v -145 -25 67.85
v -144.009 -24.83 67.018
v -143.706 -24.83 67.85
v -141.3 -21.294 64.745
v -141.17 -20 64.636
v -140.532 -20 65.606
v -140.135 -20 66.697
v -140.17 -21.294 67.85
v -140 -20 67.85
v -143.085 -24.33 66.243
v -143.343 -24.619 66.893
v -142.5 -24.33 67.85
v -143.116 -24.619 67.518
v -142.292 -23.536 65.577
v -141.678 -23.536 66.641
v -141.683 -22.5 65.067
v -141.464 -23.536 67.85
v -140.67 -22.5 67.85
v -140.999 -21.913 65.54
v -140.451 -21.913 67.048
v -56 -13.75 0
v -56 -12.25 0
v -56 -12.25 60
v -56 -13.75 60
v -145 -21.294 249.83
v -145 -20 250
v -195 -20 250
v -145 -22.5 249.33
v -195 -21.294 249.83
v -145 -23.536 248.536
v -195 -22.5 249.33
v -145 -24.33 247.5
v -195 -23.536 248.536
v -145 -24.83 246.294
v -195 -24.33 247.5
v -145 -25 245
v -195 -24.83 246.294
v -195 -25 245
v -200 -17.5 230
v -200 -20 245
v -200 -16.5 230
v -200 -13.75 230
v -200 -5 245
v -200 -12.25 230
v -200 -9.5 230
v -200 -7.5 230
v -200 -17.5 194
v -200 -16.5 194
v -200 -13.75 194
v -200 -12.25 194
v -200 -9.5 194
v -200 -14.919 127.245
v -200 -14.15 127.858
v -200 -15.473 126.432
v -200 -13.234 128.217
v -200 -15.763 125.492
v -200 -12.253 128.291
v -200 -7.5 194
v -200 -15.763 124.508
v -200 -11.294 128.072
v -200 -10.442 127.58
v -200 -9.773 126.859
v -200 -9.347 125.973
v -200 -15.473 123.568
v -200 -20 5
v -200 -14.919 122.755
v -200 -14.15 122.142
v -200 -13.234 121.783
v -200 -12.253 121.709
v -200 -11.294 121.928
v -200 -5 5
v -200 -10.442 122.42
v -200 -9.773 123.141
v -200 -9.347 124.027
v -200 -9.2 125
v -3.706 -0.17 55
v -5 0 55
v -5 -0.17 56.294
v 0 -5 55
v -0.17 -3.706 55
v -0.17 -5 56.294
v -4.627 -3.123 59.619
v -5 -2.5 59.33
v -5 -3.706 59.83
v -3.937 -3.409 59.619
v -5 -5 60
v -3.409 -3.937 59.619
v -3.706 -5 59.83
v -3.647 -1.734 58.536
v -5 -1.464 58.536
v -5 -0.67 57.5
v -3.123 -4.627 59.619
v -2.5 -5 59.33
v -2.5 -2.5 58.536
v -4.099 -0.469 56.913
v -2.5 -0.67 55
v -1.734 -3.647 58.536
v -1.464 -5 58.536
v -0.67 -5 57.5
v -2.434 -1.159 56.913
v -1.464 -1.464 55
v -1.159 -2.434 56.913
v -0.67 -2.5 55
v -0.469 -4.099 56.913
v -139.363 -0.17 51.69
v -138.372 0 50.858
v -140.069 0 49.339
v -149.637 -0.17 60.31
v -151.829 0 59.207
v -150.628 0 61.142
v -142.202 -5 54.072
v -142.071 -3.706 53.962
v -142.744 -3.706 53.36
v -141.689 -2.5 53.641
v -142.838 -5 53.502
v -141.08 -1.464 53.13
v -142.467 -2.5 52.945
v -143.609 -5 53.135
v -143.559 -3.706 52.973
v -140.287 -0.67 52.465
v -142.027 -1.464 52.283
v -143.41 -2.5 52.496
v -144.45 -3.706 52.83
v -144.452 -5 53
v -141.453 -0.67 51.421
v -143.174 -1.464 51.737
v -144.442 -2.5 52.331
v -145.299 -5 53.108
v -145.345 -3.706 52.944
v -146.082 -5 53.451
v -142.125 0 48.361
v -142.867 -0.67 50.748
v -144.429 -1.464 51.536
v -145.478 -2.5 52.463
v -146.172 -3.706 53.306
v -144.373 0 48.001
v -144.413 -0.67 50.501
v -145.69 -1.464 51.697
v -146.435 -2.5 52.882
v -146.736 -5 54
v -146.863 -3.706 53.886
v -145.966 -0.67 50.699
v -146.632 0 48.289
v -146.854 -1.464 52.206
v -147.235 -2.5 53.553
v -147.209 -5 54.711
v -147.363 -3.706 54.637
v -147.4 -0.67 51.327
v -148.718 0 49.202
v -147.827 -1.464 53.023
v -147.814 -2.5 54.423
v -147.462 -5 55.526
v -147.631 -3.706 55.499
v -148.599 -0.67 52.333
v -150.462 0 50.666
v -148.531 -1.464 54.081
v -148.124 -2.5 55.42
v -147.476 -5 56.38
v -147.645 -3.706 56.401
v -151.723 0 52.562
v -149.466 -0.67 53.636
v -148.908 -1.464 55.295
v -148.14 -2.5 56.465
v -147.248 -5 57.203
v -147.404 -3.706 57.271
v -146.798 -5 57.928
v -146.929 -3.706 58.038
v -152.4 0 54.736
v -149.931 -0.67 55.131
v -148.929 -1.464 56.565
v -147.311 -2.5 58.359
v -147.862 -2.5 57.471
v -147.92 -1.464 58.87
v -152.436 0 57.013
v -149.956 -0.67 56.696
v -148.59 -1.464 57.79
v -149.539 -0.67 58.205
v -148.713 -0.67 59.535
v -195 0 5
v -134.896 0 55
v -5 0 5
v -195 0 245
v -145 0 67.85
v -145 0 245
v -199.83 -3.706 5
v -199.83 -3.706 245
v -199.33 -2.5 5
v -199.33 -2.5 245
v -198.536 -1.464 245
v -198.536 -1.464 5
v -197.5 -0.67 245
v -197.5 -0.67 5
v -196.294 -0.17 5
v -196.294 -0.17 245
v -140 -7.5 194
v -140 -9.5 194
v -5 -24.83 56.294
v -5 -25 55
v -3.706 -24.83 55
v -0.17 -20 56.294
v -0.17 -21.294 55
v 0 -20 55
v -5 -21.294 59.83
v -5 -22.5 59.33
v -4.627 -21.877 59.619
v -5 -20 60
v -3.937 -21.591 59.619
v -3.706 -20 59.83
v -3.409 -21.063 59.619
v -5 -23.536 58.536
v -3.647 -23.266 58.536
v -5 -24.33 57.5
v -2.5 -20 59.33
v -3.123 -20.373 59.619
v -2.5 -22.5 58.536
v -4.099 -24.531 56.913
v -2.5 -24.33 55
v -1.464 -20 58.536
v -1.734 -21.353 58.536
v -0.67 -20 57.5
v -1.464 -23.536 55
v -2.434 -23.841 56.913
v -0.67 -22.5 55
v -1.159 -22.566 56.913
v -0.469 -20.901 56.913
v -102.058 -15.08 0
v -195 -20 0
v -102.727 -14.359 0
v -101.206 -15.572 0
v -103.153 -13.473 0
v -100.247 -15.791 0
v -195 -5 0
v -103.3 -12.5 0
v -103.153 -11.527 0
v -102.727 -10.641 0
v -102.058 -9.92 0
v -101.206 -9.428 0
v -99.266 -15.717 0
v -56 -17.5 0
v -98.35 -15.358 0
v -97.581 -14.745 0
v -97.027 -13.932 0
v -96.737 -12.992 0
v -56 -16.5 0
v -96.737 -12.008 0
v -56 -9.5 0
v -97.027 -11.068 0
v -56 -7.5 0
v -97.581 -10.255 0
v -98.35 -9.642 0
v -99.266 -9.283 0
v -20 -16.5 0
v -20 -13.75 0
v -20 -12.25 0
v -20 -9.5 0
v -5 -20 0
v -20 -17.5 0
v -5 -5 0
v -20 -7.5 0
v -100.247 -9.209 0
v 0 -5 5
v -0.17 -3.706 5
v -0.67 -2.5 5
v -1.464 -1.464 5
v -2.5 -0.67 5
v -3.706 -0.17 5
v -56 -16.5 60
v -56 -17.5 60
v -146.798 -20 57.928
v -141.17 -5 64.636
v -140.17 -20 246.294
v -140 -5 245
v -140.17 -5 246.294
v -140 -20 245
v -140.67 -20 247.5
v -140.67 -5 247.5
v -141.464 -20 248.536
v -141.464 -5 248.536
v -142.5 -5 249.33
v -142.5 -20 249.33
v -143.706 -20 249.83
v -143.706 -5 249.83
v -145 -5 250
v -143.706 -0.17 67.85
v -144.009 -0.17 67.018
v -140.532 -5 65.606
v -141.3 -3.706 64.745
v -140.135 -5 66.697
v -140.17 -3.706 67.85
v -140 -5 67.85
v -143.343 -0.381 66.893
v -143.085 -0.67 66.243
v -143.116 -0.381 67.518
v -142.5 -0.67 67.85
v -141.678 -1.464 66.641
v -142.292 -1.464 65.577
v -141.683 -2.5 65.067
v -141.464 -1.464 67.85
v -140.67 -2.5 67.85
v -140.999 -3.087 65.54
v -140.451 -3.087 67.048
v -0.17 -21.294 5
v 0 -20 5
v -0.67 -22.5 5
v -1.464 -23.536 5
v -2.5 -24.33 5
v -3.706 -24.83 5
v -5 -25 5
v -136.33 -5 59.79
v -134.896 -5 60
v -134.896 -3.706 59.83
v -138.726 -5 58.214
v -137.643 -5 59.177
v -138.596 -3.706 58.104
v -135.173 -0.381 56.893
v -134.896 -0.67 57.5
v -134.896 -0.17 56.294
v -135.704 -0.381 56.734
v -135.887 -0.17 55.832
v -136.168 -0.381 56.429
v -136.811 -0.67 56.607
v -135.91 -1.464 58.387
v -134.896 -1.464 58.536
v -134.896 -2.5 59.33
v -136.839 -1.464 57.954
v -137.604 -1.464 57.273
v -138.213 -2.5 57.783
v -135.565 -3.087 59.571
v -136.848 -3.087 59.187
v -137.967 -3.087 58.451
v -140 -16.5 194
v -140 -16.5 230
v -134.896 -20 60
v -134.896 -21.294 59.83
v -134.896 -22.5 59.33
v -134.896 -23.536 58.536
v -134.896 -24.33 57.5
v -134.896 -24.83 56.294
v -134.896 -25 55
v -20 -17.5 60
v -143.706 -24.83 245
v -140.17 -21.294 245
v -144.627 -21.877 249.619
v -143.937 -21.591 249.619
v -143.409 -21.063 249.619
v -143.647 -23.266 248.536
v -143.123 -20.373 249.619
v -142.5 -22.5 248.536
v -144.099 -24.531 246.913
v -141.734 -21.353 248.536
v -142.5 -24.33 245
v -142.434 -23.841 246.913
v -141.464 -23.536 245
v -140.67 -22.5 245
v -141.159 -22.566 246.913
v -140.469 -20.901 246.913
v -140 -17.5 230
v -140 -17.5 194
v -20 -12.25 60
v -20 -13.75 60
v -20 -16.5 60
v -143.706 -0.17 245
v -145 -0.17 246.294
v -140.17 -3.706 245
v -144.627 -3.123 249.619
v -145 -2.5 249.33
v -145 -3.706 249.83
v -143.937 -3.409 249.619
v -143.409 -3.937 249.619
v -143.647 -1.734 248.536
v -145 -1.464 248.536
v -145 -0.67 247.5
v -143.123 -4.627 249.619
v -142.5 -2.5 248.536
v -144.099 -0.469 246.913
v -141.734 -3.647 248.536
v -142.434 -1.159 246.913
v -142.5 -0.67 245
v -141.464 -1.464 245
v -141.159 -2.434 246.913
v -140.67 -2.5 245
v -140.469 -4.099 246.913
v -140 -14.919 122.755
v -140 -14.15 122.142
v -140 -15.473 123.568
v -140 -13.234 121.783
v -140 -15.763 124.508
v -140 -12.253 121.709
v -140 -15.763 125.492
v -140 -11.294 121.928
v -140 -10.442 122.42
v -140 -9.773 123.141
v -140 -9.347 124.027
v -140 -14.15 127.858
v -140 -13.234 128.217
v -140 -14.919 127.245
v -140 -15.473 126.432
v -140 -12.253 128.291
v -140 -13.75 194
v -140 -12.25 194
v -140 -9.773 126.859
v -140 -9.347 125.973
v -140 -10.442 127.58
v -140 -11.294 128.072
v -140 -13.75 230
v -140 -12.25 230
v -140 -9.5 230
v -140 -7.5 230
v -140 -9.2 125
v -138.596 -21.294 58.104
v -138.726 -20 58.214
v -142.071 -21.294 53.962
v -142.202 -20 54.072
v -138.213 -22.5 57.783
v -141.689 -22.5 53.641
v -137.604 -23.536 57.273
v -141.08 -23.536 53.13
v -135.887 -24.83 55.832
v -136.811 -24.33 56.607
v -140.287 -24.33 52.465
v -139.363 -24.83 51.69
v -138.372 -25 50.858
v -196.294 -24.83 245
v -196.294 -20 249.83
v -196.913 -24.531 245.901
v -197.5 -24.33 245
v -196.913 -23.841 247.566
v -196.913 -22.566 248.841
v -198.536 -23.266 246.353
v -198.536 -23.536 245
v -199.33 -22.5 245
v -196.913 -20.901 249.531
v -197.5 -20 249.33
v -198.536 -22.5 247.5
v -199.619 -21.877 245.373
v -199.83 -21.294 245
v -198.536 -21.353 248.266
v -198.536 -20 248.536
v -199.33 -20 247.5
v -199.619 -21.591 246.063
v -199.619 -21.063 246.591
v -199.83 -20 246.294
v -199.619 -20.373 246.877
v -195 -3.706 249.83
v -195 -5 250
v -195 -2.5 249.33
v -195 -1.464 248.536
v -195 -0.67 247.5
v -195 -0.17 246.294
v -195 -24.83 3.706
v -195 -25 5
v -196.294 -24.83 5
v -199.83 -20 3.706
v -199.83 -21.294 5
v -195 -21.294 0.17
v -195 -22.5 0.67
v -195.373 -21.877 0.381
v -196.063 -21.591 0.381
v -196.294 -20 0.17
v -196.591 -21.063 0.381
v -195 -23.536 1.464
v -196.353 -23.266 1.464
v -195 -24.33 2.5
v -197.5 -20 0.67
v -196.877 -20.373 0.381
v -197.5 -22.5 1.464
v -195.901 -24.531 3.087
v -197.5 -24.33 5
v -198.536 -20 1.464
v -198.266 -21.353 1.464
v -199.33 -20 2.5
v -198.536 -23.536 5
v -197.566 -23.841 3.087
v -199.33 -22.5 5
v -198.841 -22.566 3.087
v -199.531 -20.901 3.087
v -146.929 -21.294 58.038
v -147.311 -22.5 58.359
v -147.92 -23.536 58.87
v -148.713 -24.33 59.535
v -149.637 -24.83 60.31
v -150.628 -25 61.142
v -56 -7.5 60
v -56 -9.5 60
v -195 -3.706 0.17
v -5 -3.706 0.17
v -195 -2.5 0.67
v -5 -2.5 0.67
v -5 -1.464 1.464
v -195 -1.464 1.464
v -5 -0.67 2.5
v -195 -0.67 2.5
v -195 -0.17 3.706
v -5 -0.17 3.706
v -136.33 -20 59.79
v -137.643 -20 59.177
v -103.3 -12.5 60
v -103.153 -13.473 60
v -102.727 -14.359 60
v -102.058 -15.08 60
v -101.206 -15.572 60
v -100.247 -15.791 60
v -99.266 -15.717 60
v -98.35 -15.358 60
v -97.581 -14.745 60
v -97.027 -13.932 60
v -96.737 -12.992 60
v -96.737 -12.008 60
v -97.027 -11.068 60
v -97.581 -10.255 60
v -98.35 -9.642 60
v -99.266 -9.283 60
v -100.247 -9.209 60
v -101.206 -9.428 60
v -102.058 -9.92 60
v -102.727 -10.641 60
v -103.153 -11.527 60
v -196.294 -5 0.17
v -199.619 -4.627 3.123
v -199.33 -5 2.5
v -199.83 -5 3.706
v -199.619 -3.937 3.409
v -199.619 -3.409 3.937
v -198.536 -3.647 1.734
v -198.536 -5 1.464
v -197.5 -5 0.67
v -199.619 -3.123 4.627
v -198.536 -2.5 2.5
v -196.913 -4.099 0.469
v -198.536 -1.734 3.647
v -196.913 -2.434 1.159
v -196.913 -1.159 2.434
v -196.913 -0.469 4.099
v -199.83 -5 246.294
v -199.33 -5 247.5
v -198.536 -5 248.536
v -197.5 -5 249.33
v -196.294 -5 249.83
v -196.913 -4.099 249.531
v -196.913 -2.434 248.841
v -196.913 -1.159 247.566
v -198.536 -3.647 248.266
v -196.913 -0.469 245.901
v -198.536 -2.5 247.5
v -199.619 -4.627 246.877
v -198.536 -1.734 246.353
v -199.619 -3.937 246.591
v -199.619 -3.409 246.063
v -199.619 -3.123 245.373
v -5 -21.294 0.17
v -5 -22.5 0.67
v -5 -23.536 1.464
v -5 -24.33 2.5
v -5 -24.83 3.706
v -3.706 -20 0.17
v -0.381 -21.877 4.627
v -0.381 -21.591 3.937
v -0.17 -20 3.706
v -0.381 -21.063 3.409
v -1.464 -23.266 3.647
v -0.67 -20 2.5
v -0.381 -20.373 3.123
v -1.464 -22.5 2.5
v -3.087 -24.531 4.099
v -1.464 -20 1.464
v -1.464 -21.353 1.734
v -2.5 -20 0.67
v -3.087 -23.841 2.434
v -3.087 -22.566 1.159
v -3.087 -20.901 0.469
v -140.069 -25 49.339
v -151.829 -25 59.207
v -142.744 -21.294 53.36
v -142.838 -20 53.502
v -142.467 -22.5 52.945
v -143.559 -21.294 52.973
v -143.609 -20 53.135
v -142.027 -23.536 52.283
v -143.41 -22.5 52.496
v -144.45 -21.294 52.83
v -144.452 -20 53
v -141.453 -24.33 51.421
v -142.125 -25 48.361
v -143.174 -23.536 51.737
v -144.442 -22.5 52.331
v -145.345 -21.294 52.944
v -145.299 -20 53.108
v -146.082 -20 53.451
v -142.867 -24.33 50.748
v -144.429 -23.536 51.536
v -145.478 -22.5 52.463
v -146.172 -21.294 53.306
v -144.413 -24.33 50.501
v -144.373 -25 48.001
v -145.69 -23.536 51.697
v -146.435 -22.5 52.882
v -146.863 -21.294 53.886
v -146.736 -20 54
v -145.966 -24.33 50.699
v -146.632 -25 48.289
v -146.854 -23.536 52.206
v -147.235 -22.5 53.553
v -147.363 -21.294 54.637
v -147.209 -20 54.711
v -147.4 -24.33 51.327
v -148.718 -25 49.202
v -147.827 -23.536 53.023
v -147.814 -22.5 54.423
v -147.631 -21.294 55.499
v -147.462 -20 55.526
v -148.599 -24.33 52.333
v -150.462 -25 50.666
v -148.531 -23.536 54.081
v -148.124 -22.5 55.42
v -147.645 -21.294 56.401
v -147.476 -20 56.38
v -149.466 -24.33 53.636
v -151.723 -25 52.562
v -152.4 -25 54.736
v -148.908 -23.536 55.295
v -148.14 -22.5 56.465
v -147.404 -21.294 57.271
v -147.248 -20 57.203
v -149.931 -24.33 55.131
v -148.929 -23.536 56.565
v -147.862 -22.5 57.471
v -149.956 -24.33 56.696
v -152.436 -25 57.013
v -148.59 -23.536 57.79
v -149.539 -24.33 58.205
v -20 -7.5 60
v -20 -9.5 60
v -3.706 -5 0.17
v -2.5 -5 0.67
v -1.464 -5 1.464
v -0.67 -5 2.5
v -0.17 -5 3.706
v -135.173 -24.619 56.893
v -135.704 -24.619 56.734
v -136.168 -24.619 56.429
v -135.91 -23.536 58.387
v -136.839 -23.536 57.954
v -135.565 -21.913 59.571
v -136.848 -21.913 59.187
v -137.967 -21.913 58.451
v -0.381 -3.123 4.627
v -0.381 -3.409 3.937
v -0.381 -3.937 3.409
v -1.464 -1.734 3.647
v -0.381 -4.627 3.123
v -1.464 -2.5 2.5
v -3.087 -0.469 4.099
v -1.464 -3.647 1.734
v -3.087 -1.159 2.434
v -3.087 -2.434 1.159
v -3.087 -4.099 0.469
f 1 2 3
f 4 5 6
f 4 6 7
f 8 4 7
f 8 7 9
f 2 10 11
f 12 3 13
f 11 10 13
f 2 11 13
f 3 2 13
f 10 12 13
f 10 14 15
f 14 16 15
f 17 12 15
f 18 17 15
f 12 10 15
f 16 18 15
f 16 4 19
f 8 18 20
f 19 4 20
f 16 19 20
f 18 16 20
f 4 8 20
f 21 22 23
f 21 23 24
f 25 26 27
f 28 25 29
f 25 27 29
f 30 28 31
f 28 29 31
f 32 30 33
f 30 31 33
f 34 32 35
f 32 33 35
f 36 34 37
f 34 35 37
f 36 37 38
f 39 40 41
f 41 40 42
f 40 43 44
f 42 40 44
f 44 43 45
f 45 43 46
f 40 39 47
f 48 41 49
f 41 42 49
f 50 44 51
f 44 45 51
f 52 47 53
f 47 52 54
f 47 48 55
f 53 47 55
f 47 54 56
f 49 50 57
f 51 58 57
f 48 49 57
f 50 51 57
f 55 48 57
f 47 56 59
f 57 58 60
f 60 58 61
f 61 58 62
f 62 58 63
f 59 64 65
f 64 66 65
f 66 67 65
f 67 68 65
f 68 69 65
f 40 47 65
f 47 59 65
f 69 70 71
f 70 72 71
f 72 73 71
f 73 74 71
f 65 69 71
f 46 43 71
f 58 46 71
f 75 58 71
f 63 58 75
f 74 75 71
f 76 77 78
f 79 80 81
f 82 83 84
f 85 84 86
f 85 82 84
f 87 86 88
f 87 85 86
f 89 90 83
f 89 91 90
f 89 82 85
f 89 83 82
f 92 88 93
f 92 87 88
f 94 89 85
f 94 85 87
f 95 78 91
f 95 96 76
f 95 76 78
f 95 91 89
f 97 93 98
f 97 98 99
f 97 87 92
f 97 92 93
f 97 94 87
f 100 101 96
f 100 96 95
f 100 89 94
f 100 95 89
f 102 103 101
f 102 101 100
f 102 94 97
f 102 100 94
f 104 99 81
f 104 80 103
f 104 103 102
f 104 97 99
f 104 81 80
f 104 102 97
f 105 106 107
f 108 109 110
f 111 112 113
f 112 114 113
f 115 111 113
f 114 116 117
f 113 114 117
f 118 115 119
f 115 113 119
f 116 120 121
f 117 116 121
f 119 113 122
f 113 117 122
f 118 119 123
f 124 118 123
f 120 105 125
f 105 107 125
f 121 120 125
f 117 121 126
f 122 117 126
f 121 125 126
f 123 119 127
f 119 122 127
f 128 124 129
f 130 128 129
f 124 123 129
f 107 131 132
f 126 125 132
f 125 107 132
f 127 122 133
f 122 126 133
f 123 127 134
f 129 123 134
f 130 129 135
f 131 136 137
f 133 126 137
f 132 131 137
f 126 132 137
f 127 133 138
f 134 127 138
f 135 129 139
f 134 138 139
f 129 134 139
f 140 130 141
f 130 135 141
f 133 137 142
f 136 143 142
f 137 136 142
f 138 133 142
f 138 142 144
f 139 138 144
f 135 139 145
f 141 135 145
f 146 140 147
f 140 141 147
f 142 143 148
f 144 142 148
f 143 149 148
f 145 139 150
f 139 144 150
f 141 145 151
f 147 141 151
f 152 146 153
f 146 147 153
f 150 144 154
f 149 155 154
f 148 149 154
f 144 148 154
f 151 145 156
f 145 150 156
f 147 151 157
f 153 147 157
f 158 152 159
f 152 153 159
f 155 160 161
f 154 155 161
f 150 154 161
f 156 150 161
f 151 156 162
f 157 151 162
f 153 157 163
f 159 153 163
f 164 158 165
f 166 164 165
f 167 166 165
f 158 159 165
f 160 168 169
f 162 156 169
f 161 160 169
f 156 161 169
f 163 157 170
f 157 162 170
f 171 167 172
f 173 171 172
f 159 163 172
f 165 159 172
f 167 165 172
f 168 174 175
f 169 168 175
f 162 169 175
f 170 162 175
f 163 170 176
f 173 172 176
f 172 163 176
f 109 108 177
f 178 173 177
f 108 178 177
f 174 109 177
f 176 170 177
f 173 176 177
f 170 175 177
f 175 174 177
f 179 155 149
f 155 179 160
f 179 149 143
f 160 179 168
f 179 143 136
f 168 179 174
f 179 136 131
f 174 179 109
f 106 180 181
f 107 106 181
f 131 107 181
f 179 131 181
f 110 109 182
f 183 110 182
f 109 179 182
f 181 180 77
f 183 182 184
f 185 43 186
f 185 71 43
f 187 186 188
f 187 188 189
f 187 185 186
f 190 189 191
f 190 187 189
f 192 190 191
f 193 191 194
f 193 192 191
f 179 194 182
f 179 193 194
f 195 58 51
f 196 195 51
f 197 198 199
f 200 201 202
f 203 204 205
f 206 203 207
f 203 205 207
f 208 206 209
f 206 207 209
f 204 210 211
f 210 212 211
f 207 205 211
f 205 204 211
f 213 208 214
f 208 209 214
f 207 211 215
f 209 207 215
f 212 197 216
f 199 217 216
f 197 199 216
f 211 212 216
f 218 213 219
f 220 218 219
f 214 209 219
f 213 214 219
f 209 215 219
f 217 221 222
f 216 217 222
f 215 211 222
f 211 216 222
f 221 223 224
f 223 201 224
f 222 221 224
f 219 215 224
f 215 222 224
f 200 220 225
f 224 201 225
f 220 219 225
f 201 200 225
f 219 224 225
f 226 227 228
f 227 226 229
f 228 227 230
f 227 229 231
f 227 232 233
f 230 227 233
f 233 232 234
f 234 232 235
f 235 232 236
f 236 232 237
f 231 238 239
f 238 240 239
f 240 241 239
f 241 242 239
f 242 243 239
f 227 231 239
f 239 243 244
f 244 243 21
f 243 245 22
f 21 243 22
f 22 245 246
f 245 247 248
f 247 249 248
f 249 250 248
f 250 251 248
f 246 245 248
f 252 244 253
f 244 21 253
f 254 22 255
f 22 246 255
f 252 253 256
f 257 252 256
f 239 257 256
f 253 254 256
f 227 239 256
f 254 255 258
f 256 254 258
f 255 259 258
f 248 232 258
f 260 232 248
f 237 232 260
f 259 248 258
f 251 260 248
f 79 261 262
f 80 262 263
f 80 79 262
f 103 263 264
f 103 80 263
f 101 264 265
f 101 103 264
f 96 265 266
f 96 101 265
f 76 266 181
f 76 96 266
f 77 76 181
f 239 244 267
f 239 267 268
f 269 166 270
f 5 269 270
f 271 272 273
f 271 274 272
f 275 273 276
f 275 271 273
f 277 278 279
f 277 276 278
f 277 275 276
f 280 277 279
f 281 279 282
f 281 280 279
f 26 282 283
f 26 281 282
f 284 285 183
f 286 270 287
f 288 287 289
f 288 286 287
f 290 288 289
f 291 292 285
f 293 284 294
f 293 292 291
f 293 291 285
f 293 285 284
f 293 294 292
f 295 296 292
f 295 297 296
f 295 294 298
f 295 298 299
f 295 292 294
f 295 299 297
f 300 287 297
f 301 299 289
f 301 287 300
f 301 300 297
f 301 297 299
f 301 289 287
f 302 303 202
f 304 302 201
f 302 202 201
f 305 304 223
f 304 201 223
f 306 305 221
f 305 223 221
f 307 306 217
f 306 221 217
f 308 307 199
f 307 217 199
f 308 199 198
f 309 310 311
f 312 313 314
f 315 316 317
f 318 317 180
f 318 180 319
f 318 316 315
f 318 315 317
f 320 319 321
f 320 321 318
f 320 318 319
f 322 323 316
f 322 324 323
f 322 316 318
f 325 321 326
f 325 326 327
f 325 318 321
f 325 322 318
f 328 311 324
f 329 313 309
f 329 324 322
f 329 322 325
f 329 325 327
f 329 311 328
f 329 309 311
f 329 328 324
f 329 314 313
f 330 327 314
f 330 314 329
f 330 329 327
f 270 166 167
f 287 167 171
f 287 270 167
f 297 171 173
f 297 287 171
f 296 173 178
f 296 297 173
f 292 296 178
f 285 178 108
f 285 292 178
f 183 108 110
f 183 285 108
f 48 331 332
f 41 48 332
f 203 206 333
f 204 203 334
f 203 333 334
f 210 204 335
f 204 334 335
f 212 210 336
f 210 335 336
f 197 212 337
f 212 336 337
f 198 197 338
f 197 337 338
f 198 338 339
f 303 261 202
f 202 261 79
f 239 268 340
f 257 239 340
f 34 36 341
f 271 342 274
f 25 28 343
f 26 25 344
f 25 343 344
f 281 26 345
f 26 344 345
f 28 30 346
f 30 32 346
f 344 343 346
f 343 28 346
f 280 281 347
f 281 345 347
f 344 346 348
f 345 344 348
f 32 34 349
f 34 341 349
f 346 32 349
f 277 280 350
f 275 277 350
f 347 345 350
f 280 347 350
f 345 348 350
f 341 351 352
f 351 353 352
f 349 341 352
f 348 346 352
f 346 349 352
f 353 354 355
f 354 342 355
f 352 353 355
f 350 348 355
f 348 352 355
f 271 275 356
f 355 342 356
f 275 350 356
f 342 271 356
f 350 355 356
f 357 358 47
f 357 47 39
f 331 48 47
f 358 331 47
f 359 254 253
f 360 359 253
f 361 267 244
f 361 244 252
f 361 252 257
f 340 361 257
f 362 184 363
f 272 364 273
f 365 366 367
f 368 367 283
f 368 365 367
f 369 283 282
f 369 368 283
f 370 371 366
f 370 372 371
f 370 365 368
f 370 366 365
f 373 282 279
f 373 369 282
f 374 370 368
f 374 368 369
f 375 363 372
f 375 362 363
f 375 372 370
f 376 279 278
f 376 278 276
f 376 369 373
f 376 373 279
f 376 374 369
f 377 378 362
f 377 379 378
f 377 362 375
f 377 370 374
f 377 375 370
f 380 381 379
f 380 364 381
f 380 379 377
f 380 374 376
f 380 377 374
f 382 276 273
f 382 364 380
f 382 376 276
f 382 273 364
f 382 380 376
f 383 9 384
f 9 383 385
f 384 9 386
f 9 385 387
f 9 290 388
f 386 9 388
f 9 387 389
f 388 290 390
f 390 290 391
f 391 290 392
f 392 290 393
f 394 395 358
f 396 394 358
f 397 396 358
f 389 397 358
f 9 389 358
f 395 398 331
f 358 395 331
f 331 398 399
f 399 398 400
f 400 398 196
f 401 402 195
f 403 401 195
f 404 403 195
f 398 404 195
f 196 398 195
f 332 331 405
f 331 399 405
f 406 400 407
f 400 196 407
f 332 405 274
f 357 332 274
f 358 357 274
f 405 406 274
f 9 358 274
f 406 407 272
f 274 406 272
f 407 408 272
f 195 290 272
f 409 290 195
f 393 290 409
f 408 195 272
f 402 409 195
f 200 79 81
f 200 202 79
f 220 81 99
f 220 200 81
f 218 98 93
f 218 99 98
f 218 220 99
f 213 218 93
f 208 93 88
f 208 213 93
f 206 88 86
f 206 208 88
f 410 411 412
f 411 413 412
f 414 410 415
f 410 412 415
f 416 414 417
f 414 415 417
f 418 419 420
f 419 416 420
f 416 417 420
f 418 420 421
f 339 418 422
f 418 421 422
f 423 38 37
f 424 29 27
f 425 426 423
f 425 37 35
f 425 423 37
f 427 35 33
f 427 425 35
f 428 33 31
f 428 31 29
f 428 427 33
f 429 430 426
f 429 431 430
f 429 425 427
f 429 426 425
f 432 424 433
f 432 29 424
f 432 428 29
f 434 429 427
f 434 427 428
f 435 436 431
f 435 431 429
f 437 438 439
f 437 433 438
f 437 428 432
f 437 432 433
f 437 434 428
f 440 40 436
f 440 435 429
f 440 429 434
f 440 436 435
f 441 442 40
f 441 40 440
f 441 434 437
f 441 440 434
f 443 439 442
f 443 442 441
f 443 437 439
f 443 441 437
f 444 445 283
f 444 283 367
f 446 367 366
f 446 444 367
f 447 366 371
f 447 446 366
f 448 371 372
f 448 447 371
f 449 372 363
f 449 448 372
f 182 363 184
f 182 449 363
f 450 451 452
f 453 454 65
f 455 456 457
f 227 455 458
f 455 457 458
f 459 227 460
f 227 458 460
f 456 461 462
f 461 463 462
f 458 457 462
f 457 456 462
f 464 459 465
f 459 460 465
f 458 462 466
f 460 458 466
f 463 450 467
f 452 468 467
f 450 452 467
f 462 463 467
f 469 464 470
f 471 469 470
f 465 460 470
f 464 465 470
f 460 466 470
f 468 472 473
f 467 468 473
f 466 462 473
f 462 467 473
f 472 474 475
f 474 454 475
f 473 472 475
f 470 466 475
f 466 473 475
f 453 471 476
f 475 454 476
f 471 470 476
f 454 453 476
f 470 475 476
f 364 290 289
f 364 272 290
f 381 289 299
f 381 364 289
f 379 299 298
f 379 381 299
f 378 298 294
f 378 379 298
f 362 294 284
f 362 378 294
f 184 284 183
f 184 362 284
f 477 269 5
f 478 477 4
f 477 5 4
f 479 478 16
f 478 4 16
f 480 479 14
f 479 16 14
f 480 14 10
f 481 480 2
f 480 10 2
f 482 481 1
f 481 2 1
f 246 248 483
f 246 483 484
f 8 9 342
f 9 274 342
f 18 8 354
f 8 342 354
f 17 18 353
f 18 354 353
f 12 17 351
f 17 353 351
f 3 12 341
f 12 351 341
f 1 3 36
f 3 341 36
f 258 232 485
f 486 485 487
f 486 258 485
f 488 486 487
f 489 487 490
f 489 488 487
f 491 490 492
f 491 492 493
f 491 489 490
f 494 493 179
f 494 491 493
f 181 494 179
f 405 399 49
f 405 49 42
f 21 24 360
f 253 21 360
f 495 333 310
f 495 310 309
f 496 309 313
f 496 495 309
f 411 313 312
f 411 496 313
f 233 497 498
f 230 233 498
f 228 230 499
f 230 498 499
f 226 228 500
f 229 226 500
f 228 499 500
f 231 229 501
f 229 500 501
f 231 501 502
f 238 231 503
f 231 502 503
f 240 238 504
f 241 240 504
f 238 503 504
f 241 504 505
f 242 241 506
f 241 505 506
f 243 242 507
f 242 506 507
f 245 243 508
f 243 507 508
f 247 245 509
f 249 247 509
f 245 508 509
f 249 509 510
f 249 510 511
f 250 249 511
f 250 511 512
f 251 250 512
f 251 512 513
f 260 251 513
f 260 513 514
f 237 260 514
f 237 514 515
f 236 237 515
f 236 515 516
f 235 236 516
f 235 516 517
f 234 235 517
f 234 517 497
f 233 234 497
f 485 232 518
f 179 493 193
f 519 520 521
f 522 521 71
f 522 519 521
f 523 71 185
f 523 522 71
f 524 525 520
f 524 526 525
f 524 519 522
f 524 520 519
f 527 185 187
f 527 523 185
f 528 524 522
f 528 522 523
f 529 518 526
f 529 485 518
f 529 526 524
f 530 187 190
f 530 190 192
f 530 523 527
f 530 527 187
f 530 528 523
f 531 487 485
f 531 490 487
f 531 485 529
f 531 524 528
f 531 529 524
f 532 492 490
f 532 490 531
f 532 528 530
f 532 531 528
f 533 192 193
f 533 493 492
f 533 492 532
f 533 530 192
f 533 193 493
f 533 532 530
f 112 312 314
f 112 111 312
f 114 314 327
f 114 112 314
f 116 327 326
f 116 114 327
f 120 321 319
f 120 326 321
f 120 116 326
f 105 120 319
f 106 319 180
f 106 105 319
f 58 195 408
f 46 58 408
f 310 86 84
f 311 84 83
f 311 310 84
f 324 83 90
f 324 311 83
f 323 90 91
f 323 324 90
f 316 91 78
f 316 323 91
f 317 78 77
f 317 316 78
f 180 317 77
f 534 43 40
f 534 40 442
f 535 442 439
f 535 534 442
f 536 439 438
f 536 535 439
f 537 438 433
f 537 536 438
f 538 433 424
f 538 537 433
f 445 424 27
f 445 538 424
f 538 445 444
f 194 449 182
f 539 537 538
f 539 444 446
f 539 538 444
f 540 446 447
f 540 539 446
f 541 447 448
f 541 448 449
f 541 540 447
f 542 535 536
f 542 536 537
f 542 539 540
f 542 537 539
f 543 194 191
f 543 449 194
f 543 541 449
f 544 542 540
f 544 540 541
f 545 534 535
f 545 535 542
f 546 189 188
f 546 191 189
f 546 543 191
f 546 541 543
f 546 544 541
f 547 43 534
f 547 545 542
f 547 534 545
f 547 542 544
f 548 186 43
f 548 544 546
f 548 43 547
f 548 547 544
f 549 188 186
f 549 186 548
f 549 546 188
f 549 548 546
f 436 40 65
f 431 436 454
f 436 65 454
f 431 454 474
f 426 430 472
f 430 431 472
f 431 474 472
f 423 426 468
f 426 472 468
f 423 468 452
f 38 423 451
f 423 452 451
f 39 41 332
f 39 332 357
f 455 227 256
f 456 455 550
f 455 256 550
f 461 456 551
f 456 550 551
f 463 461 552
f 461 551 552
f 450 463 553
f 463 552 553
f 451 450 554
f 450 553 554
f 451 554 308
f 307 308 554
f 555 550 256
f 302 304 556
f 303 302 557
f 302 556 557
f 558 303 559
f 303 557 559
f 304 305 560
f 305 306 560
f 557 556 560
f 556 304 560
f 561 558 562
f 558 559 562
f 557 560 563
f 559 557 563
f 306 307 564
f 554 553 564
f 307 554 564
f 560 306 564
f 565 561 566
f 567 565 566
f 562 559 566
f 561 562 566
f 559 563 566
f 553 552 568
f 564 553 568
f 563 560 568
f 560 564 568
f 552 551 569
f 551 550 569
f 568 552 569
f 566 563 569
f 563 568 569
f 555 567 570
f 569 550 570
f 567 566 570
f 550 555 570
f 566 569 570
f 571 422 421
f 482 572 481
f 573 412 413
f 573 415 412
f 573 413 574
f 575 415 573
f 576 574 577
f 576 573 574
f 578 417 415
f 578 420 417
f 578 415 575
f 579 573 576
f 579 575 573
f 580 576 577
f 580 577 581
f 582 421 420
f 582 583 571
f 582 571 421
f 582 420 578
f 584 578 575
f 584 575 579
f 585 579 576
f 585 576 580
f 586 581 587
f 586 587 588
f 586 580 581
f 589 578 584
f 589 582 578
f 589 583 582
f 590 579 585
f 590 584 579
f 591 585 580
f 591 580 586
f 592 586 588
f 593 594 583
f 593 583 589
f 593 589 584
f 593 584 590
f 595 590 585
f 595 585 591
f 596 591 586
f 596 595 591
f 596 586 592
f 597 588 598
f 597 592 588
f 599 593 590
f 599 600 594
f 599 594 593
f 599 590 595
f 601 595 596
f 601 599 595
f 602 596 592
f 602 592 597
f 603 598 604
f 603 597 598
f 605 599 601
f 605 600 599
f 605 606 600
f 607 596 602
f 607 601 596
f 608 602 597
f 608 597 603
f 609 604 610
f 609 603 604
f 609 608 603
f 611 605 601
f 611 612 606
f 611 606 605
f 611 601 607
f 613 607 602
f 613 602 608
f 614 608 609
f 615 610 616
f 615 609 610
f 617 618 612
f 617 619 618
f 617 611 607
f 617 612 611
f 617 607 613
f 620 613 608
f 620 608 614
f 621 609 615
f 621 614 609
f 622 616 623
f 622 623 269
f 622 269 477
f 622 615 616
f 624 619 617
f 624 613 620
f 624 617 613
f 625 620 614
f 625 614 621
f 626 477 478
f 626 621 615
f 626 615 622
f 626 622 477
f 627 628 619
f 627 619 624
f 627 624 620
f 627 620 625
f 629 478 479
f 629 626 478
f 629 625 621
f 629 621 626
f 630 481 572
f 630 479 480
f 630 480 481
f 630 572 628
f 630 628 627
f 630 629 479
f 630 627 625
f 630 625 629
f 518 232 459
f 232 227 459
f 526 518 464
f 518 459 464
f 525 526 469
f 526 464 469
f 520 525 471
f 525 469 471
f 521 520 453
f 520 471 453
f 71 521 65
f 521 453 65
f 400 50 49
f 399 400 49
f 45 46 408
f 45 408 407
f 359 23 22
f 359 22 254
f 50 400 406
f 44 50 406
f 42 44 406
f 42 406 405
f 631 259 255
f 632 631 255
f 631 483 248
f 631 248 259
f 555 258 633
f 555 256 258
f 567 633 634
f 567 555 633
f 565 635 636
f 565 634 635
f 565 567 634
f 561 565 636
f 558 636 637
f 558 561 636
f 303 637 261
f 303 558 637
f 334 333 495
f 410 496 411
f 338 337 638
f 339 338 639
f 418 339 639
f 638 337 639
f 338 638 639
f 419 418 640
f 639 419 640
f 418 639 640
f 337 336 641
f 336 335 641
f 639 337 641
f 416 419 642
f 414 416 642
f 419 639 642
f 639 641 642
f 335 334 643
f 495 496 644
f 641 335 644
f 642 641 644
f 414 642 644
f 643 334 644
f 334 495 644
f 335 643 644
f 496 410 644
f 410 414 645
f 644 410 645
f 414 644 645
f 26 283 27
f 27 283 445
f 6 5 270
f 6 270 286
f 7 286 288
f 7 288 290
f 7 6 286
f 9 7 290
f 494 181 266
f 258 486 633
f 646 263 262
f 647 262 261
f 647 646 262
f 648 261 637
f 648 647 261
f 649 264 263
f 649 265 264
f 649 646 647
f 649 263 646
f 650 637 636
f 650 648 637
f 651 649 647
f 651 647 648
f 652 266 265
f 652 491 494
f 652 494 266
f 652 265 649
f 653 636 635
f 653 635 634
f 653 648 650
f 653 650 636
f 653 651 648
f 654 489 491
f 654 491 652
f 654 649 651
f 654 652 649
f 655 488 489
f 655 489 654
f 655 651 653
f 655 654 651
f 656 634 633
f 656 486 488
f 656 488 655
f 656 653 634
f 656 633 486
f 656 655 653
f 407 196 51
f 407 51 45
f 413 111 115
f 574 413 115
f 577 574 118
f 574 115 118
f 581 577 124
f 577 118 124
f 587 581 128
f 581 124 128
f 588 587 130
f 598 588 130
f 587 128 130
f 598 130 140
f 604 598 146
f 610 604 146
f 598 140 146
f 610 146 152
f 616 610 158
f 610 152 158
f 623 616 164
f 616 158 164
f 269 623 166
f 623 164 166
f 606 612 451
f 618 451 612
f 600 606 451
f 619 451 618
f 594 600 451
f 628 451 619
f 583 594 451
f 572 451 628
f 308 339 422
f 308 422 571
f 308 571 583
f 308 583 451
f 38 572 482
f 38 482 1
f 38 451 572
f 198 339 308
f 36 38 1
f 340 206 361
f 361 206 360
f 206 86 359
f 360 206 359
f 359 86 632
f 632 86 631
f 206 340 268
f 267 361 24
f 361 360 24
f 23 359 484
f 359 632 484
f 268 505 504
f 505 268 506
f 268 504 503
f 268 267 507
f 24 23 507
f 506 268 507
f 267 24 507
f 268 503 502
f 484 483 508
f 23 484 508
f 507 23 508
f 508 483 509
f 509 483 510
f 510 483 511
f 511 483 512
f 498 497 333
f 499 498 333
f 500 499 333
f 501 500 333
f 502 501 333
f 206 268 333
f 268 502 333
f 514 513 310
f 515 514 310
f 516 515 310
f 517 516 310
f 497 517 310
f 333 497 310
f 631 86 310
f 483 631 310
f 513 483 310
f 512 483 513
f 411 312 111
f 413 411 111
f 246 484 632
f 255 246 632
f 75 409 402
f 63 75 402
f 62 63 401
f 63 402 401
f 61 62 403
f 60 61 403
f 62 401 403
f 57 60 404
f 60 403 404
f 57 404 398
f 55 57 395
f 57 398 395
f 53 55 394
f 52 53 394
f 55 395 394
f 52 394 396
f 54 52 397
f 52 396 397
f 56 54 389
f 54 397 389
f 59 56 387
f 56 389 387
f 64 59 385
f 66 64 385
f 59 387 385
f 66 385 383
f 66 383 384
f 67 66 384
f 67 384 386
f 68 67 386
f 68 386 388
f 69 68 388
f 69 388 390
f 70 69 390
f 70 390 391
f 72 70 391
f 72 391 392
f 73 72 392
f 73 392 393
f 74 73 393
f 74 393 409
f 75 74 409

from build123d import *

# Parameters (mm, degrees)
F1_DEPTH     = 25
F2_R         = 5
F3_T1_DEPTH  = 15
F3_S5_W      = 5
F3_S5_H      = 5
F3_T6_DEPTH  = 5
F3_S11_W     = 5
F3_S11_H     = 5
F3_T12_DEPTH = 5
F4_W         = 36
F4_H         = 1
F4_H_2       = 1.5
F4_H_3       = 2
F5_DEPTH     = 64.1
F7_D         = 6.6
F8_W         = 2
F8_H         = 36
F8_W_2       = 1
F8_W_3       = 1.5
F9_DEPTH     = 69
F11_D        = 6.6


# Not quite as in the source:
# - a fillet or chamfer that OpenCascade refuses, or shapes differently, is made with other operations: its cross-section is extruded or revolved along the edge and cut away or added


with BuildPart() as f1:
    # F0 (on Front) → F1 (new body)
    with BuildSketch(Plane.XZ):
        with BuildLine():
            Line((-200, 0), (0, 0))
            Line((0, 0), (0, 60))
            Line((0, 60), (-137.2273796073, 60))
            Line((-137.2273796073, 60), (-142.2018666706, 54.0716371709))
            ThreePointArc((-142.2018666706, 54.0716371709), (-146.4283628291, 53.7018666706), (-146.7981333294, 57.9283628291))
            Line((-146.7981333294, 57.9283628291), (-140, 66.0300626473))
            Line((-140, 66.0300626473), (-140, 250))
            Line((-140, 250), (-200, 250))
            Line((-200, 250), (-200, 0))
        make_face()
    extrude(amount=F1_DEPTH)

    # F2
    f2_edges = [f1.edges().sort_by_distance(p)[0] for p in [
        (-200, -25, 125),
        (-100, -25, 0),
        (0, -25, 30),
        (-68.61369, -25, 60),
        (-139.714623, -25, 57.035819),
        (-146.428363, -25, 53.701867),
        (-143.399067, -25, 61.979213),
        (-140, -25, 158.015031),
        (-170, -25, 250),
        (-100, 0, 0),
        (-200, -12.5, 0),
        (-200, 0, 125),
        (0, 0, 30),
        (-68.61369, 0, 60),
        (-139.714623, 0, 57.035819),
        (-146.428363, 0, 53.701867),
        (-143.399067, 0, 61.979213),
        (-140, 0, 158.015031),
        (-170, 0, 250),
        (0, -12.5, 0),
        (0, -12.5, 60),
        (-137.22738, -12.5, 60),
        (-140, -12.5, 66.030063),
        (-140, -12.5, 250),
    ]]
    fillet(f2_edges, radius=F2_R)

    # F3: fillet of radius 5 on 1 edges, made by hand

    # F3_s2 → F3_t1 (cut)
    with BuildSketch(Plane.XZ.offset(5)):
        with BuildLine():
            ThreePointArc((-200, 245), (-198.5355339059, 248.5355339059), (-195, 250))
            Line((-195, 250), (-200, 250))
            Line((-200, 250), (-200, 245))
        make_face()
    extrude(amount=F3_T1_DEPTH, mode=Mode.SUBTRACT)


with BuildPart() as f3_tool4:
    # F3_s5 → F3_t6 (new body)
    with BuildSketch(Plane.YZ.offset(-195)):
        with Locations((-2.5, 247.5)):
            Rectangle(F3_S5_W, F3_S5_H)
    extrude(amount=-F3_T6_DEPTH)

    # F3_s7 → F3_t8 (revolve, cut)
    with BuildSketch(Plane(origin=(-195, -5, 245), x_dir=(0, -0.7071067812, -0.7071067812), z_dir=(0, 0.7071067812, -0.7071067812))):
        with BuildLine():
            ThreePointArc((0, -5), (5, 0), (0, 5))
            Line((0, 5), (0, -5))
        make_face()
    revolve(axis=Axis((-195, -5, 245), (-1, 0, 0)), mode=Mode.SUBTRACT)


with BuildPart() as f1_1:
    add(f1.part)

    # F3_t3: cut F3_tool4
    add(f3_tool4.part, mode=Mode.SUBTRACT)


with BuildPart() as f3_tool10:
    # F3_s11 → F3_t12 (new body)
    with BuildSketch(Plane.YZ.offset(-195)):
        with Locations((-22.5, 247.5)):
            Rectangle(F3_S11_W, F3_S11_H)
    extrude(amount=-F3_T12_DEPTH)

    # F3_s13 → F3_t14 (revolve, cut)
    with BuildSketch(Plane(origin=(-195, -20, 245), x_dir=(0, 0.7071067812, -0.7071067812), z_dir=(0, 0.7071067812, 0.7071067812))):
        with BuildLine():
            ThreePointArc((0, -5), (5, 0), (0, 5))
            Line((0, 5), (0, -5))
        make_face()
    revolve(axis=Axis((-195, -20, 245), (-1, 0, 0)), mode=Mode.SUBTRACT)


with BuildPart() as f1_2:
    add(f1_1.part)

    # F3_t9: cut F3_tool10
    add(f3_tool10.part, mode=Mode.SUBTRACT)

    # F4 (on face) → F5 (cut)
    with BuildSketch(Plane(origin=(0, 0, 0), x_dir=(1, 0, 0), z_dir=(0, 0, -1))):
        with Locations((-38, 17)):
            Rectangle(F4_W, F4_H)
        with Locations((-38, 13)):
            Rectangle(F4_W, F4_H_2)
        with Locations((-38, 8.5)):
            Rectangle(F4_W, F4_H_3)
    extrude(amount=-F5_DEPTH, mode=Mode.SUBTRACT)

    # F7 (through all)
    with Locations(Plane(origin=(0, 0, 0), x_dir=(1, 0, 0), z_dir=(0, 0, -1))):
        with Locations((-100, 12.5)):
            Hole(F7_D / 2)

    # F8 (on face) → F9 (cut)
    with BuildSketch(Plane(origin=(-200, 0, 0), x_dir=(0, -1, 0), z_dir=(-1, 0, 0))):
        with Locations((8.5, 212)):
            Rectangle(F8_W, F8_H)
        with Locations((17, 212)):
            Rectangle(F8_W_2, F8_H)
        with Locations((13, 212)):
            Rectangle(F8_W_3, F8_H)
    extrude(amount=-F9_DEPTH, mode=Mode.SUBTRACT)

    # F11 (through all)
    with Locations(Plane(origin=(-200, 0, 0), x_dir=(0, -1, 0), z_dir=(-1, 0, 0))):
        with Locations((12.5, 125)):
            Hole(F11_D / 2)


solid = f1_2.part
